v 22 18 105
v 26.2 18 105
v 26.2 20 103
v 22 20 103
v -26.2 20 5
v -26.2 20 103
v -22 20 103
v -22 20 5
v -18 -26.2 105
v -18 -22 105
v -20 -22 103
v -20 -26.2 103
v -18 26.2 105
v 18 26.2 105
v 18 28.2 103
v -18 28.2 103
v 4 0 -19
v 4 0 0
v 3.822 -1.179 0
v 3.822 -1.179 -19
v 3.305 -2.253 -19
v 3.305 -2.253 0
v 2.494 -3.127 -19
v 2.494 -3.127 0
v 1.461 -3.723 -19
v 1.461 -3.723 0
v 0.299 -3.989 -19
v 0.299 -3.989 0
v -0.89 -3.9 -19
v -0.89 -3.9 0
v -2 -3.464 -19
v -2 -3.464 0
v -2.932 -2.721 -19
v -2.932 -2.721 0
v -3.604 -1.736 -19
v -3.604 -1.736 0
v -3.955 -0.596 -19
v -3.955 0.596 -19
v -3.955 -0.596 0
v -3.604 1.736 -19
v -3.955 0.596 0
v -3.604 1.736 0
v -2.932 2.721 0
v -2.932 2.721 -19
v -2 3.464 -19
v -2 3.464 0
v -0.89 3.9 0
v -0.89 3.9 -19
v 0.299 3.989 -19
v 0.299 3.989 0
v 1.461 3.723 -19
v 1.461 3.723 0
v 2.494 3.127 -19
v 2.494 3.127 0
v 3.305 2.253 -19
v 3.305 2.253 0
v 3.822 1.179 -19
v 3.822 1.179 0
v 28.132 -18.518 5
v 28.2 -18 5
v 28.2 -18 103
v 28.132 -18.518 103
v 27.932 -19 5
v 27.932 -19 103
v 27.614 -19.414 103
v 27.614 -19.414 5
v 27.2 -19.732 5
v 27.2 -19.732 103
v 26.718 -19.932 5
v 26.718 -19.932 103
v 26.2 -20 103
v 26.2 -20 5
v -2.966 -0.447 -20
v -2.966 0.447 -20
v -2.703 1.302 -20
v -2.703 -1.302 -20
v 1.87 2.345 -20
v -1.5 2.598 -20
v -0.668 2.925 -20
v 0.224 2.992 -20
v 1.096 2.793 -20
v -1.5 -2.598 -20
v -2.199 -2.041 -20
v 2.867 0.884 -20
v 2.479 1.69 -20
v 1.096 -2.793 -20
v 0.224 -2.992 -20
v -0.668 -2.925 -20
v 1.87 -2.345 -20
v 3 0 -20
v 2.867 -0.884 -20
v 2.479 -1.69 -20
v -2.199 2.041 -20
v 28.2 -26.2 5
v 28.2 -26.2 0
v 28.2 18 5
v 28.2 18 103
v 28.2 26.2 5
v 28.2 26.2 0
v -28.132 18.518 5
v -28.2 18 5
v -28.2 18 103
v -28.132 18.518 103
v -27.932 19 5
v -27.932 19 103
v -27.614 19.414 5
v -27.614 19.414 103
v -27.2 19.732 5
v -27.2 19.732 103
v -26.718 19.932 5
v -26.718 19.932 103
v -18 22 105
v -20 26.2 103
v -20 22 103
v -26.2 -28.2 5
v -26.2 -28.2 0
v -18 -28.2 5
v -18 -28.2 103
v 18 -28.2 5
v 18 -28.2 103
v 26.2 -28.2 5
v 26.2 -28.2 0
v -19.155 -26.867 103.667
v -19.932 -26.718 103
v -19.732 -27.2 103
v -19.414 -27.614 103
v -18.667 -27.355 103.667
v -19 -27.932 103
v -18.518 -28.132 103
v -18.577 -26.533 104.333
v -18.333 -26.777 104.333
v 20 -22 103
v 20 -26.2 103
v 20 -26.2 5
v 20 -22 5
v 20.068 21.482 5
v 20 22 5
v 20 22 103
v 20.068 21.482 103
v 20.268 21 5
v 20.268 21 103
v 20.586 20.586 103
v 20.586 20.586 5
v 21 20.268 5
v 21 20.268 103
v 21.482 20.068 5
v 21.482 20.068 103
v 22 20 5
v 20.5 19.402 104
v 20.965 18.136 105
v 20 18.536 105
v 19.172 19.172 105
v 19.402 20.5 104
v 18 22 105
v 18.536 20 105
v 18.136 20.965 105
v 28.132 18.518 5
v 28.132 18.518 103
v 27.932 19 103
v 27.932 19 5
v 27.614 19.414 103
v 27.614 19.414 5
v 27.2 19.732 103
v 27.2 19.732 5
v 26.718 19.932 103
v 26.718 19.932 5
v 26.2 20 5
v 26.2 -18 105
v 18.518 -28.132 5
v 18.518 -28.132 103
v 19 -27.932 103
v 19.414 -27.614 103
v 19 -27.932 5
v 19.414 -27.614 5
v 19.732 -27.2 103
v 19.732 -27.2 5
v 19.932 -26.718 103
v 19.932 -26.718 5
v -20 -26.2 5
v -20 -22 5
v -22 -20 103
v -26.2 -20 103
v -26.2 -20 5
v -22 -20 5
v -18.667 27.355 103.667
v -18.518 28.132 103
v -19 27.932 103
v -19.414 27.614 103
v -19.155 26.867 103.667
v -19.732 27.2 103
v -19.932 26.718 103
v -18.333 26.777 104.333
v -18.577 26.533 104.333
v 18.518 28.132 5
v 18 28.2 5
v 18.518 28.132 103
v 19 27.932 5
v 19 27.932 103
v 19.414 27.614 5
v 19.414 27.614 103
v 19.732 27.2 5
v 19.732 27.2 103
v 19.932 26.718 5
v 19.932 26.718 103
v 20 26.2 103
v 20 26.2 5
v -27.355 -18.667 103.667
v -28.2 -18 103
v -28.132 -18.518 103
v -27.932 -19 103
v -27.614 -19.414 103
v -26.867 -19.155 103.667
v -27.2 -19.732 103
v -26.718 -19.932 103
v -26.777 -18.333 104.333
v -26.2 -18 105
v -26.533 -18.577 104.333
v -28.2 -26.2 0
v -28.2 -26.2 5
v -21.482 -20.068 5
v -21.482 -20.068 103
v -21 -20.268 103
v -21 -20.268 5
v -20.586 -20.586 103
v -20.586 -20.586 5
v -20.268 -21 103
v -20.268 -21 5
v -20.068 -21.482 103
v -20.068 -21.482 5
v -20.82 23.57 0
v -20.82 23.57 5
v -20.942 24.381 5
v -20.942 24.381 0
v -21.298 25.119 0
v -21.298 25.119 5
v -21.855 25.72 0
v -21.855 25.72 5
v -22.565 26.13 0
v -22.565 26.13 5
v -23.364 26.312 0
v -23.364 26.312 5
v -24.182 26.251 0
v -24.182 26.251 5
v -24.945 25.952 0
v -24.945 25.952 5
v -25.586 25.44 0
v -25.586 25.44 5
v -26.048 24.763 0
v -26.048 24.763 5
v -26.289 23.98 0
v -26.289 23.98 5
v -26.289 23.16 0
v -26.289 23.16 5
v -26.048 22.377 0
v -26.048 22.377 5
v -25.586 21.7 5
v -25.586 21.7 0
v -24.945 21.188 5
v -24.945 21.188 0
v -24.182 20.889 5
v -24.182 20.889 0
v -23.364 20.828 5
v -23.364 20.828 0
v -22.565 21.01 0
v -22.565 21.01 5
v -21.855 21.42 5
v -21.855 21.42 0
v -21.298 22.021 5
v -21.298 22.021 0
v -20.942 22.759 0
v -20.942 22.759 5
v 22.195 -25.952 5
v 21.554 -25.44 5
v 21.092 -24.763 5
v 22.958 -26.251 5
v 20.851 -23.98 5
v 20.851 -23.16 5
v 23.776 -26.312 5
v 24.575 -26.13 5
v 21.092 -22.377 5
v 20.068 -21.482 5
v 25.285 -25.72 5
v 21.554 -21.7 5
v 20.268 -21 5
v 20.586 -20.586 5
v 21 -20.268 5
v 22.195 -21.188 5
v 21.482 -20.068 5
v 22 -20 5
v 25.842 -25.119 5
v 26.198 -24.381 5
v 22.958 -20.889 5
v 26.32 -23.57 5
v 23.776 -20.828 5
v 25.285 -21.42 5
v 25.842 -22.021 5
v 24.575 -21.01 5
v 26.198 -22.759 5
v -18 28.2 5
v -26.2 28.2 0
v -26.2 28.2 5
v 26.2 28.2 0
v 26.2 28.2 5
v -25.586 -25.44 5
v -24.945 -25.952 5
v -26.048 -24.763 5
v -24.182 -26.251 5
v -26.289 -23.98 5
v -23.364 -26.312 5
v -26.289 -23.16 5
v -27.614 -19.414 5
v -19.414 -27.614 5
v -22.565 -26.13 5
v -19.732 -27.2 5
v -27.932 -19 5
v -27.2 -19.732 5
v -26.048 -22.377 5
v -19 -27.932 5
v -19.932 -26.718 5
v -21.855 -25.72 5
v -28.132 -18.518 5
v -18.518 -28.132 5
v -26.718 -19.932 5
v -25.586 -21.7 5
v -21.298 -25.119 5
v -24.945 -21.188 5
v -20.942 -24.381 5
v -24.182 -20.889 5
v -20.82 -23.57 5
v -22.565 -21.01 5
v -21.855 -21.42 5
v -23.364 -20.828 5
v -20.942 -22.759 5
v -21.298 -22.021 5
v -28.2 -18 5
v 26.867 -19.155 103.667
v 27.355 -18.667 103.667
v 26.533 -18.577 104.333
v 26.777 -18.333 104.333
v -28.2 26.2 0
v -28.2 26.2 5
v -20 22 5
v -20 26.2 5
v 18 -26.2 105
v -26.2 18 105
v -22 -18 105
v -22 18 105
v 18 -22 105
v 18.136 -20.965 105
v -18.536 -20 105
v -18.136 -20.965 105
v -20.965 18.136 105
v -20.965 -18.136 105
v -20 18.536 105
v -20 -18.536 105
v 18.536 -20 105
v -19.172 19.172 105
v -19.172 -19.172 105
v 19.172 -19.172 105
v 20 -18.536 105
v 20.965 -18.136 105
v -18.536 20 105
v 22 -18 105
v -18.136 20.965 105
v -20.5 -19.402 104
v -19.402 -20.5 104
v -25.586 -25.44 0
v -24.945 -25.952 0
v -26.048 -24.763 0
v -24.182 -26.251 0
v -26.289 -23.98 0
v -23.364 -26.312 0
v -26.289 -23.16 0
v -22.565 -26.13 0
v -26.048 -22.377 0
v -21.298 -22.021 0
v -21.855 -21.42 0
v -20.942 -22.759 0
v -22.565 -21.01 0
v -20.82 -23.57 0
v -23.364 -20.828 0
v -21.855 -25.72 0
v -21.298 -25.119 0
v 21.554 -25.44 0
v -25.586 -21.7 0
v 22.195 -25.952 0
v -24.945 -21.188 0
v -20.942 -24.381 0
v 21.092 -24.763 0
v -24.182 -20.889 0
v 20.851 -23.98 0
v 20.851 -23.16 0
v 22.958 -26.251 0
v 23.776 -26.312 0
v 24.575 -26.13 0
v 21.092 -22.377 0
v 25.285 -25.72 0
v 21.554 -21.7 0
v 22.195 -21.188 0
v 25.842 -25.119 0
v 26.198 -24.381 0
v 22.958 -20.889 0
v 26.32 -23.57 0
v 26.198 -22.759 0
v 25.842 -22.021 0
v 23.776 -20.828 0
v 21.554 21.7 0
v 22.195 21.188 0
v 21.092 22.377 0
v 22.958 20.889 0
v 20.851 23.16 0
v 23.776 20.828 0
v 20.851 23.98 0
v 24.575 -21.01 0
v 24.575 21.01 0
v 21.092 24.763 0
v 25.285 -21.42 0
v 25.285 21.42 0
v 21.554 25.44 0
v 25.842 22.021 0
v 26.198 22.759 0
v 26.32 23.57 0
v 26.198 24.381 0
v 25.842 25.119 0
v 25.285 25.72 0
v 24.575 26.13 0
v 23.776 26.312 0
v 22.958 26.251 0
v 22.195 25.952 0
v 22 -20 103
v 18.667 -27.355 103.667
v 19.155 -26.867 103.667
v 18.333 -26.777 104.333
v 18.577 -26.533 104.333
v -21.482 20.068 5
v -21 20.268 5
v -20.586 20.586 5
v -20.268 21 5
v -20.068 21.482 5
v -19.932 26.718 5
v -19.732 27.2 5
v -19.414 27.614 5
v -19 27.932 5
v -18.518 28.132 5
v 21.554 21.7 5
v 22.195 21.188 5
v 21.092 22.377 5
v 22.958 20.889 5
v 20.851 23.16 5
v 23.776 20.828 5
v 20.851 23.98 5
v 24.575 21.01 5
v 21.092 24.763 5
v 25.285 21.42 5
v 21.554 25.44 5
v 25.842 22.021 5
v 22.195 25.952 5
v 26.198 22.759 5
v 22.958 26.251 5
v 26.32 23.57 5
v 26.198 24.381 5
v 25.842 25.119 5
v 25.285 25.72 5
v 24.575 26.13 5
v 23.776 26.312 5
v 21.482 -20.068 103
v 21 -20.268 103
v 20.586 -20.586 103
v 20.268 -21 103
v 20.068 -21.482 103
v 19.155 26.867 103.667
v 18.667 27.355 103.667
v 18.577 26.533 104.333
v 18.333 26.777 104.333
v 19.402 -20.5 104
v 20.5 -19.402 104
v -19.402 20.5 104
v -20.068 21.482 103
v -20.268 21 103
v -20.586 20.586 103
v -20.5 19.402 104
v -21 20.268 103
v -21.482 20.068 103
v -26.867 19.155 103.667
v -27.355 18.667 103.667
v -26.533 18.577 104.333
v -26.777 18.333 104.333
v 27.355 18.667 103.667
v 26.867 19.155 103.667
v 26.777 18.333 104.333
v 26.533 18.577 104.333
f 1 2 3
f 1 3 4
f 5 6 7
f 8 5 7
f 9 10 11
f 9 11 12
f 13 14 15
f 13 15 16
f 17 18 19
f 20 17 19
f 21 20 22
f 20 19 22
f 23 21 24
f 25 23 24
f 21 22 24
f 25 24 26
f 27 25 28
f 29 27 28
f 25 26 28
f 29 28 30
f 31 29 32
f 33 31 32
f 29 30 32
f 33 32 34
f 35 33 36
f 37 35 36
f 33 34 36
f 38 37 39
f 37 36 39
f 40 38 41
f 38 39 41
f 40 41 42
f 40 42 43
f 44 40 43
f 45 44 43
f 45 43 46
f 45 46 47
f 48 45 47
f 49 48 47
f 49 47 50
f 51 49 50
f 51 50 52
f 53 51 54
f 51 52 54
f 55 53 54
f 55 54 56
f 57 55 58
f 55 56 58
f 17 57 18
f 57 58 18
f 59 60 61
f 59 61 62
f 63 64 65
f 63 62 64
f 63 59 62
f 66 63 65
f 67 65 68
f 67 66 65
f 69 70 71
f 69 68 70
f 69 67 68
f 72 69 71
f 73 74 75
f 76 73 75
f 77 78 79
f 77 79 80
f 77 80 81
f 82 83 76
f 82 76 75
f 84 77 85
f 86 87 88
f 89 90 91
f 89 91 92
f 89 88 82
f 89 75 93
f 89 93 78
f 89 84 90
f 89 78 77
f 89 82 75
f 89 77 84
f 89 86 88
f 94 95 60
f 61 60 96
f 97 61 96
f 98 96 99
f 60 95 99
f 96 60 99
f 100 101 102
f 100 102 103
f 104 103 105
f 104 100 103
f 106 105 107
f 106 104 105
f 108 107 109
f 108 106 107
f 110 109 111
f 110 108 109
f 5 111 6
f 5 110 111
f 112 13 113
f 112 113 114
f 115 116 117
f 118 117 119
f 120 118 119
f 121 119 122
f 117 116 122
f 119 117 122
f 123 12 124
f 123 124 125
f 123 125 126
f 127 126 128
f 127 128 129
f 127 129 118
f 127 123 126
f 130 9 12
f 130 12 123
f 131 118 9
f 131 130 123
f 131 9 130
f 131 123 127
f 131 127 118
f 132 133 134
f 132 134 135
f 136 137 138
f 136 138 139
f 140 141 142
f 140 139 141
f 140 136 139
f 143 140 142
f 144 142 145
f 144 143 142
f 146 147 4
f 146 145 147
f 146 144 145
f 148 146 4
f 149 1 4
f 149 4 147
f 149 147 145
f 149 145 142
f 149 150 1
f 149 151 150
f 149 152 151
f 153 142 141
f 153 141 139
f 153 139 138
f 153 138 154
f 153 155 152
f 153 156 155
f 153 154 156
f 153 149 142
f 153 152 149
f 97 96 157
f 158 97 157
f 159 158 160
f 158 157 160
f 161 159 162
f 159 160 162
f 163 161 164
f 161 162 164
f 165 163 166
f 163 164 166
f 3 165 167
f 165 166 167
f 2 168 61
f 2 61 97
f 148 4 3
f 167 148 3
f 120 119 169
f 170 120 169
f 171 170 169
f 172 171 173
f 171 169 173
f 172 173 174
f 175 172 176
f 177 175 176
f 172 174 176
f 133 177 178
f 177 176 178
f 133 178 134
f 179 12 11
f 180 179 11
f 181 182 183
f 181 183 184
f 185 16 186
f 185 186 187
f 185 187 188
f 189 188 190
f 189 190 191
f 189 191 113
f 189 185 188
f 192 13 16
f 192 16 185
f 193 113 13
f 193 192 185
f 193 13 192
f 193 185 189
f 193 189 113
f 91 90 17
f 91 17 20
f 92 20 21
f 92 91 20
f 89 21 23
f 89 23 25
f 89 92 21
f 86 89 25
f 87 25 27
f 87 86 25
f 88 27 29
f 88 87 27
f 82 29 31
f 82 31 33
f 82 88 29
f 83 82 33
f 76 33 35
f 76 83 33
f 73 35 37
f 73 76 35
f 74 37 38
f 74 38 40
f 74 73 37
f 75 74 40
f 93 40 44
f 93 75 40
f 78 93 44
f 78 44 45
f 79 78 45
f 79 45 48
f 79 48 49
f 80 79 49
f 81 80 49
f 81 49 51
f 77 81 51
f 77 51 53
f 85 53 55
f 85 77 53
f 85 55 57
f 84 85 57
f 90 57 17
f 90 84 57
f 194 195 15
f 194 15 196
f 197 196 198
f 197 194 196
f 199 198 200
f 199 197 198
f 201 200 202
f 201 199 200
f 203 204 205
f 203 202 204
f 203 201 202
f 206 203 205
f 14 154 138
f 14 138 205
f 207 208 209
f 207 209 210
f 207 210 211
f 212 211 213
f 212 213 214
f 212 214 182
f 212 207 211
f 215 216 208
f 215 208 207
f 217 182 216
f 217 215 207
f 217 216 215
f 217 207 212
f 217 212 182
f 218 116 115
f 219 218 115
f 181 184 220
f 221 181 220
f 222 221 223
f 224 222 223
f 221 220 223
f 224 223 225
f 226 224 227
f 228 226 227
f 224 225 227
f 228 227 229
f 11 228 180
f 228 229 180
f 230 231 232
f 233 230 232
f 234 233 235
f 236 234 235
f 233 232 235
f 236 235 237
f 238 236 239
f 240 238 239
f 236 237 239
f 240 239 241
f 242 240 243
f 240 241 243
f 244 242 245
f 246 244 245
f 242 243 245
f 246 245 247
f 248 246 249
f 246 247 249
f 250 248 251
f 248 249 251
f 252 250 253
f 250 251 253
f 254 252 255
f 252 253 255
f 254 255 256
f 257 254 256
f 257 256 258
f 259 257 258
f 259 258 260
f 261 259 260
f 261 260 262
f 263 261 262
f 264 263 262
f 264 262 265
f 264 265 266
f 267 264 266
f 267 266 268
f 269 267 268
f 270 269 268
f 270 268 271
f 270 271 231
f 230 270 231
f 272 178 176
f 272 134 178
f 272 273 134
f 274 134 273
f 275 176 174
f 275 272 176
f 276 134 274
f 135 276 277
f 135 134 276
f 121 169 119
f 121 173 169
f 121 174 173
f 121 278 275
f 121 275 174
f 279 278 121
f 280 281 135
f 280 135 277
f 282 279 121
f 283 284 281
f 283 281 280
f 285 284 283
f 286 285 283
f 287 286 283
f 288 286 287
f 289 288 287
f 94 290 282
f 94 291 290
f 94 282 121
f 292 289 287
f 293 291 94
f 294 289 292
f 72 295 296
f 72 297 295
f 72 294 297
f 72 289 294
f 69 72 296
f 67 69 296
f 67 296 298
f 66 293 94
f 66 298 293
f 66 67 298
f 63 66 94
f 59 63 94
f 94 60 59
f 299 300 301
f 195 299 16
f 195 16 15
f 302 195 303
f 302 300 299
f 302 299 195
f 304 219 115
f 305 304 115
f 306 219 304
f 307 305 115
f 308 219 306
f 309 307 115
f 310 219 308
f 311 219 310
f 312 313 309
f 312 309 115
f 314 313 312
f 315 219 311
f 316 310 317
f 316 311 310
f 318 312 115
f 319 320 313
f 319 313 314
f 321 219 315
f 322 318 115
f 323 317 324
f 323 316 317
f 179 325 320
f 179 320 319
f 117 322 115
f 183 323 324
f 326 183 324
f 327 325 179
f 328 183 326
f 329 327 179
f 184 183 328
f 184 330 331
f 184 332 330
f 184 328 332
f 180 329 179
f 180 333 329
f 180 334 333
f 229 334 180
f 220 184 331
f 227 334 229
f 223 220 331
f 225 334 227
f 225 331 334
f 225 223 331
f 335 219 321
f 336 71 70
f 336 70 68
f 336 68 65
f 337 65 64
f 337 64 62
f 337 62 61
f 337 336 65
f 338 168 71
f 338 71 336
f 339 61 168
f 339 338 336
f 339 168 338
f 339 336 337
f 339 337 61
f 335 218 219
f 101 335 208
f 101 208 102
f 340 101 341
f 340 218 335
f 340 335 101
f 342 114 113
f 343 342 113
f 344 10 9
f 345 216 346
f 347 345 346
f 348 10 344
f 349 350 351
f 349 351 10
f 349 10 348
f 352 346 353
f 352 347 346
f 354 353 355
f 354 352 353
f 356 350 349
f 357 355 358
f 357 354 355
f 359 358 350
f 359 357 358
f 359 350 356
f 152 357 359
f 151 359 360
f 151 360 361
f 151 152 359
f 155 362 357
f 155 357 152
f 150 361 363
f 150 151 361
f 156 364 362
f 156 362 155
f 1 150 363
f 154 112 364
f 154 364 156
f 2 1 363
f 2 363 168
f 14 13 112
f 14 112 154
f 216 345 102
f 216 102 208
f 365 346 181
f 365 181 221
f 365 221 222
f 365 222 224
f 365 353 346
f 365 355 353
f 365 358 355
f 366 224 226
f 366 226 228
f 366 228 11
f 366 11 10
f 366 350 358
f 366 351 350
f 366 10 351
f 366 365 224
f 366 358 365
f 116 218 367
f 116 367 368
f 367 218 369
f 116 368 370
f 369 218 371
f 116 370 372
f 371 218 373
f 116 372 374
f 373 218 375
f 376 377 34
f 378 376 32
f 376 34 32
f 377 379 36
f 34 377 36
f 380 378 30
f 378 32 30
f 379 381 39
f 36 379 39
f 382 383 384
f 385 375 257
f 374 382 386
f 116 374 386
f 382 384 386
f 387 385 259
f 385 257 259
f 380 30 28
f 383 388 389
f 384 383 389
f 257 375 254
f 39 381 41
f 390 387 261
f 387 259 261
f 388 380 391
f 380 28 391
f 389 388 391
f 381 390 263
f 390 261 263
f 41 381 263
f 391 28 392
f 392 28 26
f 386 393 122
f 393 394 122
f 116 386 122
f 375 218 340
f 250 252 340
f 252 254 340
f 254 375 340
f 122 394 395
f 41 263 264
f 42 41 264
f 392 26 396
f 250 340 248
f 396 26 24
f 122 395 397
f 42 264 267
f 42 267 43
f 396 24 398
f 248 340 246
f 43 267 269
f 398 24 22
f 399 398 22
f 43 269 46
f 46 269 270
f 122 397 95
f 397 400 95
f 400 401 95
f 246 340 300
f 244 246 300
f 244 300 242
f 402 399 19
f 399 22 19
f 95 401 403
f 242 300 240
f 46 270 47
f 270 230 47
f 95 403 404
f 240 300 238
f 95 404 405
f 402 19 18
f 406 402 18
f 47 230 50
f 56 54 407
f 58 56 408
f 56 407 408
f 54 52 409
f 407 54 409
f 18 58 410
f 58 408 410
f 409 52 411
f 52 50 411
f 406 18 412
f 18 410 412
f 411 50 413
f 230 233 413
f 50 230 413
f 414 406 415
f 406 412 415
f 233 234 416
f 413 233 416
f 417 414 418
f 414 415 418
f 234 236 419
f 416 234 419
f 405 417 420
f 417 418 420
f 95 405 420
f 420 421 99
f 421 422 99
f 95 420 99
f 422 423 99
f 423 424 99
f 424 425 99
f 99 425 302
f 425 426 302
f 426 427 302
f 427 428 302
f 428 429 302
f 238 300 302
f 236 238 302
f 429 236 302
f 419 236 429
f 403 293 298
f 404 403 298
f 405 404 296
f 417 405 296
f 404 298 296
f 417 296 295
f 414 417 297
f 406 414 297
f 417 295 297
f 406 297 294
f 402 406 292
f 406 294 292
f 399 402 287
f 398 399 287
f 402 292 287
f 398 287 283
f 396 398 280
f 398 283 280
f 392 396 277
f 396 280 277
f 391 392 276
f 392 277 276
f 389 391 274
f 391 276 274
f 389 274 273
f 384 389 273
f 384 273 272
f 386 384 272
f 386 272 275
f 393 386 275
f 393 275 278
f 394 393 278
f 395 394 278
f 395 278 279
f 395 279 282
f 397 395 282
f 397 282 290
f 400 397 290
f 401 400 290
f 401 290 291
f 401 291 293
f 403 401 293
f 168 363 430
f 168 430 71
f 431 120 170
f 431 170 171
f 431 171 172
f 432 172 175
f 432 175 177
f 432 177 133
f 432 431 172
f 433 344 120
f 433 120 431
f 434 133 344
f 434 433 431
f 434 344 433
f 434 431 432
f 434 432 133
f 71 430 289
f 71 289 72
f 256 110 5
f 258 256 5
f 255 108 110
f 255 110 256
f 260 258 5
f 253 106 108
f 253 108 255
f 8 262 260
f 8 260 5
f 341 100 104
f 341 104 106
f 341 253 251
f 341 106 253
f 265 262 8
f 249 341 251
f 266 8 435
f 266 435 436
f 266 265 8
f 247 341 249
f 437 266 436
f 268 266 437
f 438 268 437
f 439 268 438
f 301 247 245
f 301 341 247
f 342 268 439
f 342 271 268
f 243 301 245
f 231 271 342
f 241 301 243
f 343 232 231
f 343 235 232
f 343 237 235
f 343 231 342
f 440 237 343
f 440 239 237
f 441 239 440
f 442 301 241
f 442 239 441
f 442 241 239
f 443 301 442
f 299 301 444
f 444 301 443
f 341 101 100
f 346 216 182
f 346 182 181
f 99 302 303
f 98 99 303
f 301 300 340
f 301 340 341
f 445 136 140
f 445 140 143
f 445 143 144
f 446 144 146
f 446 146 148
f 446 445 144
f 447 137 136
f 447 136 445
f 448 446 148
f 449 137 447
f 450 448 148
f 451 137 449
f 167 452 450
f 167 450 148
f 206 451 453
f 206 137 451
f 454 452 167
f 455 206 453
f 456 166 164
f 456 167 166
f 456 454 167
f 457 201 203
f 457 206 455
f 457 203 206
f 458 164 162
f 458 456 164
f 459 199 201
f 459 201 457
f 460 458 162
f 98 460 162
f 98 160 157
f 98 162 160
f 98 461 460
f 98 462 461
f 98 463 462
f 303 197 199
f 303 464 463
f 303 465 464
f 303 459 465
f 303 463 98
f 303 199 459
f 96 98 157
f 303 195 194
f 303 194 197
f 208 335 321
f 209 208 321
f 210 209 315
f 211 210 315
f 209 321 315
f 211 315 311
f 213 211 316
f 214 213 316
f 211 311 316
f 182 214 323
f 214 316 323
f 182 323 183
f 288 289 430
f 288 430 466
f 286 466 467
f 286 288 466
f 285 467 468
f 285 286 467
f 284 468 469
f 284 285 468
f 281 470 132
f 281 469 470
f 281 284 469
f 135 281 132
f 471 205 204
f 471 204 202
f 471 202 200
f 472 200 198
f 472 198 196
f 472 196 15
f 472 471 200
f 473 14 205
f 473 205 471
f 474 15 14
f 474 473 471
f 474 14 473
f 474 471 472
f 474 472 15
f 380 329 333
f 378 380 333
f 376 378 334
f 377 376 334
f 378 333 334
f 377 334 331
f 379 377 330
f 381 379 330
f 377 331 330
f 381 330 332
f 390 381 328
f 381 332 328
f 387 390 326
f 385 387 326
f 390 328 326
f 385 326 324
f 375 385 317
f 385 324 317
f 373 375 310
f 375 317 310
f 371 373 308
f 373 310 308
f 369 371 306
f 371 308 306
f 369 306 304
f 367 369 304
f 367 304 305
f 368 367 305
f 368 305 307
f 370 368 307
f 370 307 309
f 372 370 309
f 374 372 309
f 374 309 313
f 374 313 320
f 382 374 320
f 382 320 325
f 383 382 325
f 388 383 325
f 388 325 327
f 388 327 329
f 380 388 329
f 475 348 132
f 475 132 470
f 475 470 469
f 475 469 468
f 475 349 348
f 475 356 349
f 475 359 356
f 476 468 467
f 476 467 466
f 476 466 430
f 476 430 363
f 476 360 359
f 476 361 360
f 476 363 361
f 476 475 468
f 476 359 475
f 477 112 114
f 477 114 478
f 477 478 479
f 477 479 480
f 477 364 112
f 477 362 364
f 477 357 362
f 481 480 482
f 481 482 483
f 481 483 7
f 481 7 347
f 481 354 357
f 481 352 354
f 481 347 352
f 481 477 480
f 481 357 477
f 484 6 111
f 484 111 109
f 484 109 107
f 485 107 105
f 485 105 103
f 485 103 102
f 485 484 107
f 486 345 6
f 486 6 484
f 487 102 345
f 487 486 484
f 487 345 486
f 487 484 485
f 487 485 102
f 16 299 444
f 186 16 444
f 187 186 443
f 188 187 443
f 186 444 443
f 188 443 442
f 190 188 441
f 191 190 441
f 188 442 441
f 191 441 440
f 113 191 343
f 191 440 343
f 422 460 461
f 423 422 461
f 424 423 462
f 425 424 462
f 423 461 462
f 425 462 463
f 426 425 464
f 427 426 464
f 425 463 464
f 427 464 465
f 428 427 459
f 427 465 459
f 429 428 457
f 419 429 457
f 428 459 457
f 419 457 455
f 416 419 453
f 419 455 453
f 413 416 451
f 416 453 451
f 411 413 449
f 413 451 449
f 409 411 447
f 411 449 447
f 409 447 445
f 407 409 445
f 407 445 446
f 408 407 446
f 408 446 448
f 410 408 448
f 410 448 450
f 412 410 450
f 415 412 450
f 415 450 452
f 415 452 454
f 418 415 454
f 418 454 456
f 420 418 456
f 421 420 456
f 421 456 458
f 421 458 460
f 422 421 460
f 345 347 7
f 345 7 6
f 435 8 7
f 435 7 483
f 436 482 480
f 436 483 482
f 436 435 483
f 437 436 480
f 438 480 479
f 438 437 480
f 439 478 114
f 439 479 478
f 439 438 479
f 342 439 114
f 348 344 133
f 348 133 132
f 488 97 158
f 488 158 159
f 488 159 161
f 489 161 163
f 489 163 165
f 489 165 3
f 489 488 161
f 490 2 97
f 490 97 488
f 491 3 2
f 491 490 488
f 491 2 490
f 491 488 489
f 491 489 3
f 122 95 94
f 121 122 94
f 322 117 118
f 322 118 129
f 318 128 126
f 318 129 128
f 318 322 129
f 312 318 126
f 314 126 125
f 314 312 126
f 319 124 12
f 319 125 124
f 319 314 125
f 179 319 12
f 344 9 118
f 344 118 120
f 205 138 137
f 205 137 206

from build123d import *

# Parameters (mm, degrees)
SZKIC1_W                    = 56.4
SZKIC1_H                    = 56.4
DODANIE_WYCI_GNI_CIE1_DEPTH = 105
SZKIC2_R                    = 4
DODANIE_WYCI_GNI_CIE2_DEPTH = 20
SZKIC3_W                    = 8.2
SZKIC3_H                    = 8.2
WYTNIJ_WYCI_GNI_CIE1_DEPTH  = 100
ZAOKR_GLENIE1_R             = 2
SFAZOWANIE1_SIZE            = 2
OTW_R_POD_RUB_M51_D         = 5.5
OTW_R_POD_RUB_M51_DEPTH     = 11
OTW_R_POD_RUB_M51_TIP       = 1.652366702
SFAZOWANIE2_SIZE            = 1


with BuildPart() as part:
    # Szkic1 → Dodanie-wyciągnięcie1 (new body)
    with BuildSketch(Plane.XY):
        Rectangle(SZKIC1_W, SZKIC1_H)
    extrude(amount=DODANIE_WYCI_GNI_CIE1_DEPTH)

    # Szkic2 → Dodanie-wyciągnięcie2 (add)
    with BuildSketch(Plane(origin=(0, 0, 0), x_dir=(-1, 0, 0), z_dir=(0, 0, -1))):
        with Locations(Location((0, 0, 0), (0, 0, 180))):
            Circle(SZKIC2_R)
    extrude(amount=DODANIE_WYCI_GNI_CIE2_DEPTH)

    # Szkic3 → Wytnij-wyciągnięcie1 (cut)
    with BuildSketch(Plane.XY.offset(105)):
        with Locations((-24.1, 24.1)):
            Rectangle(SZKIC3_W, SZKIC3_H)
        with Locations((24.1, 24.1)):
            Rectangle(SZKIC3_W, SZKIC3_H)
        with Locations((24.1, -24.1)):
            Rectangle(SZKIC3_W, SZKIC3_H)
        with Locations((-24.1, -24.1)):
            Rectangle(SZKIC3_W, SZKIC3_H)
    extrude(amount=-WYTNIJ_WYCI_GNI_CIE1_DEPTH, mode=Mode.SUBTRACT)

    # Zaokrąglenie1
    zaokr_glenie1_edges = [part.edges().sort_by_distance(p)[0] for p in [
        (-20, -28.2, 55),
        (-28.2, -20, 55),
        (-20, -20, 55),
        (28.2, -20, 55),
        (20, -28.2, 55),
        (20, -20, 55),
        (20, 28.2, 55),
        (28.2, 20, 55),
        (20, 20, 55),
        (-28.2, 20, 55),
        (-20, 28.2, 55),
        (-20, 20, 55),
    ]]
    fillet(zaokr_glenie1_edges, radius=ZAOKR_GLENIE1_R)

    # Sfazowanie1
    sfazowanie1_edges = [part.edges().sort_by_distance(p)[0] for p in [
        (-20.585786438, -20.585786438, 105),
        (20.585786438, -20.585786438, 105),
        (20.585786438, 20.585786438, 105),
        (-20.585786438, 20.585786438, 105),
        (28.2, -28.2, 2.5),
        (-28.2, -28.2, 2.5),
        (-28.2, 28.2, 2.5),
        (28.2, 28.2, 2.5),
        (-20, -24.1, 105),
        (0, -28.2, 105),
        (20, -24.1, 105),
        (24.1, -20, 105),
        (28.2, 0, 105),
        (24.1, 20, 105),
        (20, 24.1, 105),
        (0, 28.2, 105),
        (-20, 24.1, 105),
        (-24.1, 20, 105),
        (-28.2, 0, 105),
        (-24.1, -20, 105),
        (-27.614213562, 19.414213562, 105),
        (-19.414213562, 27.614213562, 105),
        (19.414213562, 27.614213562, 105),
        (27.614213562, 19.414213562, 105),
        (27.614213562, -19.414213562, 105),
        (19.414213562, -27.614213562, 105),
        (-27.614213562, -19.414213562, 105),
        (-19.414213562, -27.614213562, 105),
    ]]
    chamfer(sfazowanie1_edges, length=SFAZOWANIE1_SIZE)

    # Otwór pod śrubę M51
    with Locations(Plane(origin=(0, 0, 0), x_dir=(-1, 0, 0), z_dir=(0, 0, -1))):
        with Locations((-23.57, 23.57), (23.57, 23.57), (23.57, -23.57), (-23.57, -23.57)):
            Hole(OTW_R_POD_RUB_M51_D / 2, depth=OTW_R_POD_RUB_M51_DEPTH)
            with Locations((0, 0, -(OTW_R_POD_RUB_M51_DEPTH + OTW_R_POD_RUB_M51_TIP / 2))):  # 118° drill point
                Cone(0, OTW_R_POD_RUB_M51_D / 2, OTW_R_POD_RUB_M51_TIP, mode=Mode.SUBTRACT)

    # Sfazowanie2
    sfazowanie2_edges = [part.edges().sort_by_distance(p)[0] for p in [
        (-4, 0, -20),
    ]]
    chamfer(sfazowanie2_edges, length=SFAZOWANIE2_SIZE)


solid = part.part
